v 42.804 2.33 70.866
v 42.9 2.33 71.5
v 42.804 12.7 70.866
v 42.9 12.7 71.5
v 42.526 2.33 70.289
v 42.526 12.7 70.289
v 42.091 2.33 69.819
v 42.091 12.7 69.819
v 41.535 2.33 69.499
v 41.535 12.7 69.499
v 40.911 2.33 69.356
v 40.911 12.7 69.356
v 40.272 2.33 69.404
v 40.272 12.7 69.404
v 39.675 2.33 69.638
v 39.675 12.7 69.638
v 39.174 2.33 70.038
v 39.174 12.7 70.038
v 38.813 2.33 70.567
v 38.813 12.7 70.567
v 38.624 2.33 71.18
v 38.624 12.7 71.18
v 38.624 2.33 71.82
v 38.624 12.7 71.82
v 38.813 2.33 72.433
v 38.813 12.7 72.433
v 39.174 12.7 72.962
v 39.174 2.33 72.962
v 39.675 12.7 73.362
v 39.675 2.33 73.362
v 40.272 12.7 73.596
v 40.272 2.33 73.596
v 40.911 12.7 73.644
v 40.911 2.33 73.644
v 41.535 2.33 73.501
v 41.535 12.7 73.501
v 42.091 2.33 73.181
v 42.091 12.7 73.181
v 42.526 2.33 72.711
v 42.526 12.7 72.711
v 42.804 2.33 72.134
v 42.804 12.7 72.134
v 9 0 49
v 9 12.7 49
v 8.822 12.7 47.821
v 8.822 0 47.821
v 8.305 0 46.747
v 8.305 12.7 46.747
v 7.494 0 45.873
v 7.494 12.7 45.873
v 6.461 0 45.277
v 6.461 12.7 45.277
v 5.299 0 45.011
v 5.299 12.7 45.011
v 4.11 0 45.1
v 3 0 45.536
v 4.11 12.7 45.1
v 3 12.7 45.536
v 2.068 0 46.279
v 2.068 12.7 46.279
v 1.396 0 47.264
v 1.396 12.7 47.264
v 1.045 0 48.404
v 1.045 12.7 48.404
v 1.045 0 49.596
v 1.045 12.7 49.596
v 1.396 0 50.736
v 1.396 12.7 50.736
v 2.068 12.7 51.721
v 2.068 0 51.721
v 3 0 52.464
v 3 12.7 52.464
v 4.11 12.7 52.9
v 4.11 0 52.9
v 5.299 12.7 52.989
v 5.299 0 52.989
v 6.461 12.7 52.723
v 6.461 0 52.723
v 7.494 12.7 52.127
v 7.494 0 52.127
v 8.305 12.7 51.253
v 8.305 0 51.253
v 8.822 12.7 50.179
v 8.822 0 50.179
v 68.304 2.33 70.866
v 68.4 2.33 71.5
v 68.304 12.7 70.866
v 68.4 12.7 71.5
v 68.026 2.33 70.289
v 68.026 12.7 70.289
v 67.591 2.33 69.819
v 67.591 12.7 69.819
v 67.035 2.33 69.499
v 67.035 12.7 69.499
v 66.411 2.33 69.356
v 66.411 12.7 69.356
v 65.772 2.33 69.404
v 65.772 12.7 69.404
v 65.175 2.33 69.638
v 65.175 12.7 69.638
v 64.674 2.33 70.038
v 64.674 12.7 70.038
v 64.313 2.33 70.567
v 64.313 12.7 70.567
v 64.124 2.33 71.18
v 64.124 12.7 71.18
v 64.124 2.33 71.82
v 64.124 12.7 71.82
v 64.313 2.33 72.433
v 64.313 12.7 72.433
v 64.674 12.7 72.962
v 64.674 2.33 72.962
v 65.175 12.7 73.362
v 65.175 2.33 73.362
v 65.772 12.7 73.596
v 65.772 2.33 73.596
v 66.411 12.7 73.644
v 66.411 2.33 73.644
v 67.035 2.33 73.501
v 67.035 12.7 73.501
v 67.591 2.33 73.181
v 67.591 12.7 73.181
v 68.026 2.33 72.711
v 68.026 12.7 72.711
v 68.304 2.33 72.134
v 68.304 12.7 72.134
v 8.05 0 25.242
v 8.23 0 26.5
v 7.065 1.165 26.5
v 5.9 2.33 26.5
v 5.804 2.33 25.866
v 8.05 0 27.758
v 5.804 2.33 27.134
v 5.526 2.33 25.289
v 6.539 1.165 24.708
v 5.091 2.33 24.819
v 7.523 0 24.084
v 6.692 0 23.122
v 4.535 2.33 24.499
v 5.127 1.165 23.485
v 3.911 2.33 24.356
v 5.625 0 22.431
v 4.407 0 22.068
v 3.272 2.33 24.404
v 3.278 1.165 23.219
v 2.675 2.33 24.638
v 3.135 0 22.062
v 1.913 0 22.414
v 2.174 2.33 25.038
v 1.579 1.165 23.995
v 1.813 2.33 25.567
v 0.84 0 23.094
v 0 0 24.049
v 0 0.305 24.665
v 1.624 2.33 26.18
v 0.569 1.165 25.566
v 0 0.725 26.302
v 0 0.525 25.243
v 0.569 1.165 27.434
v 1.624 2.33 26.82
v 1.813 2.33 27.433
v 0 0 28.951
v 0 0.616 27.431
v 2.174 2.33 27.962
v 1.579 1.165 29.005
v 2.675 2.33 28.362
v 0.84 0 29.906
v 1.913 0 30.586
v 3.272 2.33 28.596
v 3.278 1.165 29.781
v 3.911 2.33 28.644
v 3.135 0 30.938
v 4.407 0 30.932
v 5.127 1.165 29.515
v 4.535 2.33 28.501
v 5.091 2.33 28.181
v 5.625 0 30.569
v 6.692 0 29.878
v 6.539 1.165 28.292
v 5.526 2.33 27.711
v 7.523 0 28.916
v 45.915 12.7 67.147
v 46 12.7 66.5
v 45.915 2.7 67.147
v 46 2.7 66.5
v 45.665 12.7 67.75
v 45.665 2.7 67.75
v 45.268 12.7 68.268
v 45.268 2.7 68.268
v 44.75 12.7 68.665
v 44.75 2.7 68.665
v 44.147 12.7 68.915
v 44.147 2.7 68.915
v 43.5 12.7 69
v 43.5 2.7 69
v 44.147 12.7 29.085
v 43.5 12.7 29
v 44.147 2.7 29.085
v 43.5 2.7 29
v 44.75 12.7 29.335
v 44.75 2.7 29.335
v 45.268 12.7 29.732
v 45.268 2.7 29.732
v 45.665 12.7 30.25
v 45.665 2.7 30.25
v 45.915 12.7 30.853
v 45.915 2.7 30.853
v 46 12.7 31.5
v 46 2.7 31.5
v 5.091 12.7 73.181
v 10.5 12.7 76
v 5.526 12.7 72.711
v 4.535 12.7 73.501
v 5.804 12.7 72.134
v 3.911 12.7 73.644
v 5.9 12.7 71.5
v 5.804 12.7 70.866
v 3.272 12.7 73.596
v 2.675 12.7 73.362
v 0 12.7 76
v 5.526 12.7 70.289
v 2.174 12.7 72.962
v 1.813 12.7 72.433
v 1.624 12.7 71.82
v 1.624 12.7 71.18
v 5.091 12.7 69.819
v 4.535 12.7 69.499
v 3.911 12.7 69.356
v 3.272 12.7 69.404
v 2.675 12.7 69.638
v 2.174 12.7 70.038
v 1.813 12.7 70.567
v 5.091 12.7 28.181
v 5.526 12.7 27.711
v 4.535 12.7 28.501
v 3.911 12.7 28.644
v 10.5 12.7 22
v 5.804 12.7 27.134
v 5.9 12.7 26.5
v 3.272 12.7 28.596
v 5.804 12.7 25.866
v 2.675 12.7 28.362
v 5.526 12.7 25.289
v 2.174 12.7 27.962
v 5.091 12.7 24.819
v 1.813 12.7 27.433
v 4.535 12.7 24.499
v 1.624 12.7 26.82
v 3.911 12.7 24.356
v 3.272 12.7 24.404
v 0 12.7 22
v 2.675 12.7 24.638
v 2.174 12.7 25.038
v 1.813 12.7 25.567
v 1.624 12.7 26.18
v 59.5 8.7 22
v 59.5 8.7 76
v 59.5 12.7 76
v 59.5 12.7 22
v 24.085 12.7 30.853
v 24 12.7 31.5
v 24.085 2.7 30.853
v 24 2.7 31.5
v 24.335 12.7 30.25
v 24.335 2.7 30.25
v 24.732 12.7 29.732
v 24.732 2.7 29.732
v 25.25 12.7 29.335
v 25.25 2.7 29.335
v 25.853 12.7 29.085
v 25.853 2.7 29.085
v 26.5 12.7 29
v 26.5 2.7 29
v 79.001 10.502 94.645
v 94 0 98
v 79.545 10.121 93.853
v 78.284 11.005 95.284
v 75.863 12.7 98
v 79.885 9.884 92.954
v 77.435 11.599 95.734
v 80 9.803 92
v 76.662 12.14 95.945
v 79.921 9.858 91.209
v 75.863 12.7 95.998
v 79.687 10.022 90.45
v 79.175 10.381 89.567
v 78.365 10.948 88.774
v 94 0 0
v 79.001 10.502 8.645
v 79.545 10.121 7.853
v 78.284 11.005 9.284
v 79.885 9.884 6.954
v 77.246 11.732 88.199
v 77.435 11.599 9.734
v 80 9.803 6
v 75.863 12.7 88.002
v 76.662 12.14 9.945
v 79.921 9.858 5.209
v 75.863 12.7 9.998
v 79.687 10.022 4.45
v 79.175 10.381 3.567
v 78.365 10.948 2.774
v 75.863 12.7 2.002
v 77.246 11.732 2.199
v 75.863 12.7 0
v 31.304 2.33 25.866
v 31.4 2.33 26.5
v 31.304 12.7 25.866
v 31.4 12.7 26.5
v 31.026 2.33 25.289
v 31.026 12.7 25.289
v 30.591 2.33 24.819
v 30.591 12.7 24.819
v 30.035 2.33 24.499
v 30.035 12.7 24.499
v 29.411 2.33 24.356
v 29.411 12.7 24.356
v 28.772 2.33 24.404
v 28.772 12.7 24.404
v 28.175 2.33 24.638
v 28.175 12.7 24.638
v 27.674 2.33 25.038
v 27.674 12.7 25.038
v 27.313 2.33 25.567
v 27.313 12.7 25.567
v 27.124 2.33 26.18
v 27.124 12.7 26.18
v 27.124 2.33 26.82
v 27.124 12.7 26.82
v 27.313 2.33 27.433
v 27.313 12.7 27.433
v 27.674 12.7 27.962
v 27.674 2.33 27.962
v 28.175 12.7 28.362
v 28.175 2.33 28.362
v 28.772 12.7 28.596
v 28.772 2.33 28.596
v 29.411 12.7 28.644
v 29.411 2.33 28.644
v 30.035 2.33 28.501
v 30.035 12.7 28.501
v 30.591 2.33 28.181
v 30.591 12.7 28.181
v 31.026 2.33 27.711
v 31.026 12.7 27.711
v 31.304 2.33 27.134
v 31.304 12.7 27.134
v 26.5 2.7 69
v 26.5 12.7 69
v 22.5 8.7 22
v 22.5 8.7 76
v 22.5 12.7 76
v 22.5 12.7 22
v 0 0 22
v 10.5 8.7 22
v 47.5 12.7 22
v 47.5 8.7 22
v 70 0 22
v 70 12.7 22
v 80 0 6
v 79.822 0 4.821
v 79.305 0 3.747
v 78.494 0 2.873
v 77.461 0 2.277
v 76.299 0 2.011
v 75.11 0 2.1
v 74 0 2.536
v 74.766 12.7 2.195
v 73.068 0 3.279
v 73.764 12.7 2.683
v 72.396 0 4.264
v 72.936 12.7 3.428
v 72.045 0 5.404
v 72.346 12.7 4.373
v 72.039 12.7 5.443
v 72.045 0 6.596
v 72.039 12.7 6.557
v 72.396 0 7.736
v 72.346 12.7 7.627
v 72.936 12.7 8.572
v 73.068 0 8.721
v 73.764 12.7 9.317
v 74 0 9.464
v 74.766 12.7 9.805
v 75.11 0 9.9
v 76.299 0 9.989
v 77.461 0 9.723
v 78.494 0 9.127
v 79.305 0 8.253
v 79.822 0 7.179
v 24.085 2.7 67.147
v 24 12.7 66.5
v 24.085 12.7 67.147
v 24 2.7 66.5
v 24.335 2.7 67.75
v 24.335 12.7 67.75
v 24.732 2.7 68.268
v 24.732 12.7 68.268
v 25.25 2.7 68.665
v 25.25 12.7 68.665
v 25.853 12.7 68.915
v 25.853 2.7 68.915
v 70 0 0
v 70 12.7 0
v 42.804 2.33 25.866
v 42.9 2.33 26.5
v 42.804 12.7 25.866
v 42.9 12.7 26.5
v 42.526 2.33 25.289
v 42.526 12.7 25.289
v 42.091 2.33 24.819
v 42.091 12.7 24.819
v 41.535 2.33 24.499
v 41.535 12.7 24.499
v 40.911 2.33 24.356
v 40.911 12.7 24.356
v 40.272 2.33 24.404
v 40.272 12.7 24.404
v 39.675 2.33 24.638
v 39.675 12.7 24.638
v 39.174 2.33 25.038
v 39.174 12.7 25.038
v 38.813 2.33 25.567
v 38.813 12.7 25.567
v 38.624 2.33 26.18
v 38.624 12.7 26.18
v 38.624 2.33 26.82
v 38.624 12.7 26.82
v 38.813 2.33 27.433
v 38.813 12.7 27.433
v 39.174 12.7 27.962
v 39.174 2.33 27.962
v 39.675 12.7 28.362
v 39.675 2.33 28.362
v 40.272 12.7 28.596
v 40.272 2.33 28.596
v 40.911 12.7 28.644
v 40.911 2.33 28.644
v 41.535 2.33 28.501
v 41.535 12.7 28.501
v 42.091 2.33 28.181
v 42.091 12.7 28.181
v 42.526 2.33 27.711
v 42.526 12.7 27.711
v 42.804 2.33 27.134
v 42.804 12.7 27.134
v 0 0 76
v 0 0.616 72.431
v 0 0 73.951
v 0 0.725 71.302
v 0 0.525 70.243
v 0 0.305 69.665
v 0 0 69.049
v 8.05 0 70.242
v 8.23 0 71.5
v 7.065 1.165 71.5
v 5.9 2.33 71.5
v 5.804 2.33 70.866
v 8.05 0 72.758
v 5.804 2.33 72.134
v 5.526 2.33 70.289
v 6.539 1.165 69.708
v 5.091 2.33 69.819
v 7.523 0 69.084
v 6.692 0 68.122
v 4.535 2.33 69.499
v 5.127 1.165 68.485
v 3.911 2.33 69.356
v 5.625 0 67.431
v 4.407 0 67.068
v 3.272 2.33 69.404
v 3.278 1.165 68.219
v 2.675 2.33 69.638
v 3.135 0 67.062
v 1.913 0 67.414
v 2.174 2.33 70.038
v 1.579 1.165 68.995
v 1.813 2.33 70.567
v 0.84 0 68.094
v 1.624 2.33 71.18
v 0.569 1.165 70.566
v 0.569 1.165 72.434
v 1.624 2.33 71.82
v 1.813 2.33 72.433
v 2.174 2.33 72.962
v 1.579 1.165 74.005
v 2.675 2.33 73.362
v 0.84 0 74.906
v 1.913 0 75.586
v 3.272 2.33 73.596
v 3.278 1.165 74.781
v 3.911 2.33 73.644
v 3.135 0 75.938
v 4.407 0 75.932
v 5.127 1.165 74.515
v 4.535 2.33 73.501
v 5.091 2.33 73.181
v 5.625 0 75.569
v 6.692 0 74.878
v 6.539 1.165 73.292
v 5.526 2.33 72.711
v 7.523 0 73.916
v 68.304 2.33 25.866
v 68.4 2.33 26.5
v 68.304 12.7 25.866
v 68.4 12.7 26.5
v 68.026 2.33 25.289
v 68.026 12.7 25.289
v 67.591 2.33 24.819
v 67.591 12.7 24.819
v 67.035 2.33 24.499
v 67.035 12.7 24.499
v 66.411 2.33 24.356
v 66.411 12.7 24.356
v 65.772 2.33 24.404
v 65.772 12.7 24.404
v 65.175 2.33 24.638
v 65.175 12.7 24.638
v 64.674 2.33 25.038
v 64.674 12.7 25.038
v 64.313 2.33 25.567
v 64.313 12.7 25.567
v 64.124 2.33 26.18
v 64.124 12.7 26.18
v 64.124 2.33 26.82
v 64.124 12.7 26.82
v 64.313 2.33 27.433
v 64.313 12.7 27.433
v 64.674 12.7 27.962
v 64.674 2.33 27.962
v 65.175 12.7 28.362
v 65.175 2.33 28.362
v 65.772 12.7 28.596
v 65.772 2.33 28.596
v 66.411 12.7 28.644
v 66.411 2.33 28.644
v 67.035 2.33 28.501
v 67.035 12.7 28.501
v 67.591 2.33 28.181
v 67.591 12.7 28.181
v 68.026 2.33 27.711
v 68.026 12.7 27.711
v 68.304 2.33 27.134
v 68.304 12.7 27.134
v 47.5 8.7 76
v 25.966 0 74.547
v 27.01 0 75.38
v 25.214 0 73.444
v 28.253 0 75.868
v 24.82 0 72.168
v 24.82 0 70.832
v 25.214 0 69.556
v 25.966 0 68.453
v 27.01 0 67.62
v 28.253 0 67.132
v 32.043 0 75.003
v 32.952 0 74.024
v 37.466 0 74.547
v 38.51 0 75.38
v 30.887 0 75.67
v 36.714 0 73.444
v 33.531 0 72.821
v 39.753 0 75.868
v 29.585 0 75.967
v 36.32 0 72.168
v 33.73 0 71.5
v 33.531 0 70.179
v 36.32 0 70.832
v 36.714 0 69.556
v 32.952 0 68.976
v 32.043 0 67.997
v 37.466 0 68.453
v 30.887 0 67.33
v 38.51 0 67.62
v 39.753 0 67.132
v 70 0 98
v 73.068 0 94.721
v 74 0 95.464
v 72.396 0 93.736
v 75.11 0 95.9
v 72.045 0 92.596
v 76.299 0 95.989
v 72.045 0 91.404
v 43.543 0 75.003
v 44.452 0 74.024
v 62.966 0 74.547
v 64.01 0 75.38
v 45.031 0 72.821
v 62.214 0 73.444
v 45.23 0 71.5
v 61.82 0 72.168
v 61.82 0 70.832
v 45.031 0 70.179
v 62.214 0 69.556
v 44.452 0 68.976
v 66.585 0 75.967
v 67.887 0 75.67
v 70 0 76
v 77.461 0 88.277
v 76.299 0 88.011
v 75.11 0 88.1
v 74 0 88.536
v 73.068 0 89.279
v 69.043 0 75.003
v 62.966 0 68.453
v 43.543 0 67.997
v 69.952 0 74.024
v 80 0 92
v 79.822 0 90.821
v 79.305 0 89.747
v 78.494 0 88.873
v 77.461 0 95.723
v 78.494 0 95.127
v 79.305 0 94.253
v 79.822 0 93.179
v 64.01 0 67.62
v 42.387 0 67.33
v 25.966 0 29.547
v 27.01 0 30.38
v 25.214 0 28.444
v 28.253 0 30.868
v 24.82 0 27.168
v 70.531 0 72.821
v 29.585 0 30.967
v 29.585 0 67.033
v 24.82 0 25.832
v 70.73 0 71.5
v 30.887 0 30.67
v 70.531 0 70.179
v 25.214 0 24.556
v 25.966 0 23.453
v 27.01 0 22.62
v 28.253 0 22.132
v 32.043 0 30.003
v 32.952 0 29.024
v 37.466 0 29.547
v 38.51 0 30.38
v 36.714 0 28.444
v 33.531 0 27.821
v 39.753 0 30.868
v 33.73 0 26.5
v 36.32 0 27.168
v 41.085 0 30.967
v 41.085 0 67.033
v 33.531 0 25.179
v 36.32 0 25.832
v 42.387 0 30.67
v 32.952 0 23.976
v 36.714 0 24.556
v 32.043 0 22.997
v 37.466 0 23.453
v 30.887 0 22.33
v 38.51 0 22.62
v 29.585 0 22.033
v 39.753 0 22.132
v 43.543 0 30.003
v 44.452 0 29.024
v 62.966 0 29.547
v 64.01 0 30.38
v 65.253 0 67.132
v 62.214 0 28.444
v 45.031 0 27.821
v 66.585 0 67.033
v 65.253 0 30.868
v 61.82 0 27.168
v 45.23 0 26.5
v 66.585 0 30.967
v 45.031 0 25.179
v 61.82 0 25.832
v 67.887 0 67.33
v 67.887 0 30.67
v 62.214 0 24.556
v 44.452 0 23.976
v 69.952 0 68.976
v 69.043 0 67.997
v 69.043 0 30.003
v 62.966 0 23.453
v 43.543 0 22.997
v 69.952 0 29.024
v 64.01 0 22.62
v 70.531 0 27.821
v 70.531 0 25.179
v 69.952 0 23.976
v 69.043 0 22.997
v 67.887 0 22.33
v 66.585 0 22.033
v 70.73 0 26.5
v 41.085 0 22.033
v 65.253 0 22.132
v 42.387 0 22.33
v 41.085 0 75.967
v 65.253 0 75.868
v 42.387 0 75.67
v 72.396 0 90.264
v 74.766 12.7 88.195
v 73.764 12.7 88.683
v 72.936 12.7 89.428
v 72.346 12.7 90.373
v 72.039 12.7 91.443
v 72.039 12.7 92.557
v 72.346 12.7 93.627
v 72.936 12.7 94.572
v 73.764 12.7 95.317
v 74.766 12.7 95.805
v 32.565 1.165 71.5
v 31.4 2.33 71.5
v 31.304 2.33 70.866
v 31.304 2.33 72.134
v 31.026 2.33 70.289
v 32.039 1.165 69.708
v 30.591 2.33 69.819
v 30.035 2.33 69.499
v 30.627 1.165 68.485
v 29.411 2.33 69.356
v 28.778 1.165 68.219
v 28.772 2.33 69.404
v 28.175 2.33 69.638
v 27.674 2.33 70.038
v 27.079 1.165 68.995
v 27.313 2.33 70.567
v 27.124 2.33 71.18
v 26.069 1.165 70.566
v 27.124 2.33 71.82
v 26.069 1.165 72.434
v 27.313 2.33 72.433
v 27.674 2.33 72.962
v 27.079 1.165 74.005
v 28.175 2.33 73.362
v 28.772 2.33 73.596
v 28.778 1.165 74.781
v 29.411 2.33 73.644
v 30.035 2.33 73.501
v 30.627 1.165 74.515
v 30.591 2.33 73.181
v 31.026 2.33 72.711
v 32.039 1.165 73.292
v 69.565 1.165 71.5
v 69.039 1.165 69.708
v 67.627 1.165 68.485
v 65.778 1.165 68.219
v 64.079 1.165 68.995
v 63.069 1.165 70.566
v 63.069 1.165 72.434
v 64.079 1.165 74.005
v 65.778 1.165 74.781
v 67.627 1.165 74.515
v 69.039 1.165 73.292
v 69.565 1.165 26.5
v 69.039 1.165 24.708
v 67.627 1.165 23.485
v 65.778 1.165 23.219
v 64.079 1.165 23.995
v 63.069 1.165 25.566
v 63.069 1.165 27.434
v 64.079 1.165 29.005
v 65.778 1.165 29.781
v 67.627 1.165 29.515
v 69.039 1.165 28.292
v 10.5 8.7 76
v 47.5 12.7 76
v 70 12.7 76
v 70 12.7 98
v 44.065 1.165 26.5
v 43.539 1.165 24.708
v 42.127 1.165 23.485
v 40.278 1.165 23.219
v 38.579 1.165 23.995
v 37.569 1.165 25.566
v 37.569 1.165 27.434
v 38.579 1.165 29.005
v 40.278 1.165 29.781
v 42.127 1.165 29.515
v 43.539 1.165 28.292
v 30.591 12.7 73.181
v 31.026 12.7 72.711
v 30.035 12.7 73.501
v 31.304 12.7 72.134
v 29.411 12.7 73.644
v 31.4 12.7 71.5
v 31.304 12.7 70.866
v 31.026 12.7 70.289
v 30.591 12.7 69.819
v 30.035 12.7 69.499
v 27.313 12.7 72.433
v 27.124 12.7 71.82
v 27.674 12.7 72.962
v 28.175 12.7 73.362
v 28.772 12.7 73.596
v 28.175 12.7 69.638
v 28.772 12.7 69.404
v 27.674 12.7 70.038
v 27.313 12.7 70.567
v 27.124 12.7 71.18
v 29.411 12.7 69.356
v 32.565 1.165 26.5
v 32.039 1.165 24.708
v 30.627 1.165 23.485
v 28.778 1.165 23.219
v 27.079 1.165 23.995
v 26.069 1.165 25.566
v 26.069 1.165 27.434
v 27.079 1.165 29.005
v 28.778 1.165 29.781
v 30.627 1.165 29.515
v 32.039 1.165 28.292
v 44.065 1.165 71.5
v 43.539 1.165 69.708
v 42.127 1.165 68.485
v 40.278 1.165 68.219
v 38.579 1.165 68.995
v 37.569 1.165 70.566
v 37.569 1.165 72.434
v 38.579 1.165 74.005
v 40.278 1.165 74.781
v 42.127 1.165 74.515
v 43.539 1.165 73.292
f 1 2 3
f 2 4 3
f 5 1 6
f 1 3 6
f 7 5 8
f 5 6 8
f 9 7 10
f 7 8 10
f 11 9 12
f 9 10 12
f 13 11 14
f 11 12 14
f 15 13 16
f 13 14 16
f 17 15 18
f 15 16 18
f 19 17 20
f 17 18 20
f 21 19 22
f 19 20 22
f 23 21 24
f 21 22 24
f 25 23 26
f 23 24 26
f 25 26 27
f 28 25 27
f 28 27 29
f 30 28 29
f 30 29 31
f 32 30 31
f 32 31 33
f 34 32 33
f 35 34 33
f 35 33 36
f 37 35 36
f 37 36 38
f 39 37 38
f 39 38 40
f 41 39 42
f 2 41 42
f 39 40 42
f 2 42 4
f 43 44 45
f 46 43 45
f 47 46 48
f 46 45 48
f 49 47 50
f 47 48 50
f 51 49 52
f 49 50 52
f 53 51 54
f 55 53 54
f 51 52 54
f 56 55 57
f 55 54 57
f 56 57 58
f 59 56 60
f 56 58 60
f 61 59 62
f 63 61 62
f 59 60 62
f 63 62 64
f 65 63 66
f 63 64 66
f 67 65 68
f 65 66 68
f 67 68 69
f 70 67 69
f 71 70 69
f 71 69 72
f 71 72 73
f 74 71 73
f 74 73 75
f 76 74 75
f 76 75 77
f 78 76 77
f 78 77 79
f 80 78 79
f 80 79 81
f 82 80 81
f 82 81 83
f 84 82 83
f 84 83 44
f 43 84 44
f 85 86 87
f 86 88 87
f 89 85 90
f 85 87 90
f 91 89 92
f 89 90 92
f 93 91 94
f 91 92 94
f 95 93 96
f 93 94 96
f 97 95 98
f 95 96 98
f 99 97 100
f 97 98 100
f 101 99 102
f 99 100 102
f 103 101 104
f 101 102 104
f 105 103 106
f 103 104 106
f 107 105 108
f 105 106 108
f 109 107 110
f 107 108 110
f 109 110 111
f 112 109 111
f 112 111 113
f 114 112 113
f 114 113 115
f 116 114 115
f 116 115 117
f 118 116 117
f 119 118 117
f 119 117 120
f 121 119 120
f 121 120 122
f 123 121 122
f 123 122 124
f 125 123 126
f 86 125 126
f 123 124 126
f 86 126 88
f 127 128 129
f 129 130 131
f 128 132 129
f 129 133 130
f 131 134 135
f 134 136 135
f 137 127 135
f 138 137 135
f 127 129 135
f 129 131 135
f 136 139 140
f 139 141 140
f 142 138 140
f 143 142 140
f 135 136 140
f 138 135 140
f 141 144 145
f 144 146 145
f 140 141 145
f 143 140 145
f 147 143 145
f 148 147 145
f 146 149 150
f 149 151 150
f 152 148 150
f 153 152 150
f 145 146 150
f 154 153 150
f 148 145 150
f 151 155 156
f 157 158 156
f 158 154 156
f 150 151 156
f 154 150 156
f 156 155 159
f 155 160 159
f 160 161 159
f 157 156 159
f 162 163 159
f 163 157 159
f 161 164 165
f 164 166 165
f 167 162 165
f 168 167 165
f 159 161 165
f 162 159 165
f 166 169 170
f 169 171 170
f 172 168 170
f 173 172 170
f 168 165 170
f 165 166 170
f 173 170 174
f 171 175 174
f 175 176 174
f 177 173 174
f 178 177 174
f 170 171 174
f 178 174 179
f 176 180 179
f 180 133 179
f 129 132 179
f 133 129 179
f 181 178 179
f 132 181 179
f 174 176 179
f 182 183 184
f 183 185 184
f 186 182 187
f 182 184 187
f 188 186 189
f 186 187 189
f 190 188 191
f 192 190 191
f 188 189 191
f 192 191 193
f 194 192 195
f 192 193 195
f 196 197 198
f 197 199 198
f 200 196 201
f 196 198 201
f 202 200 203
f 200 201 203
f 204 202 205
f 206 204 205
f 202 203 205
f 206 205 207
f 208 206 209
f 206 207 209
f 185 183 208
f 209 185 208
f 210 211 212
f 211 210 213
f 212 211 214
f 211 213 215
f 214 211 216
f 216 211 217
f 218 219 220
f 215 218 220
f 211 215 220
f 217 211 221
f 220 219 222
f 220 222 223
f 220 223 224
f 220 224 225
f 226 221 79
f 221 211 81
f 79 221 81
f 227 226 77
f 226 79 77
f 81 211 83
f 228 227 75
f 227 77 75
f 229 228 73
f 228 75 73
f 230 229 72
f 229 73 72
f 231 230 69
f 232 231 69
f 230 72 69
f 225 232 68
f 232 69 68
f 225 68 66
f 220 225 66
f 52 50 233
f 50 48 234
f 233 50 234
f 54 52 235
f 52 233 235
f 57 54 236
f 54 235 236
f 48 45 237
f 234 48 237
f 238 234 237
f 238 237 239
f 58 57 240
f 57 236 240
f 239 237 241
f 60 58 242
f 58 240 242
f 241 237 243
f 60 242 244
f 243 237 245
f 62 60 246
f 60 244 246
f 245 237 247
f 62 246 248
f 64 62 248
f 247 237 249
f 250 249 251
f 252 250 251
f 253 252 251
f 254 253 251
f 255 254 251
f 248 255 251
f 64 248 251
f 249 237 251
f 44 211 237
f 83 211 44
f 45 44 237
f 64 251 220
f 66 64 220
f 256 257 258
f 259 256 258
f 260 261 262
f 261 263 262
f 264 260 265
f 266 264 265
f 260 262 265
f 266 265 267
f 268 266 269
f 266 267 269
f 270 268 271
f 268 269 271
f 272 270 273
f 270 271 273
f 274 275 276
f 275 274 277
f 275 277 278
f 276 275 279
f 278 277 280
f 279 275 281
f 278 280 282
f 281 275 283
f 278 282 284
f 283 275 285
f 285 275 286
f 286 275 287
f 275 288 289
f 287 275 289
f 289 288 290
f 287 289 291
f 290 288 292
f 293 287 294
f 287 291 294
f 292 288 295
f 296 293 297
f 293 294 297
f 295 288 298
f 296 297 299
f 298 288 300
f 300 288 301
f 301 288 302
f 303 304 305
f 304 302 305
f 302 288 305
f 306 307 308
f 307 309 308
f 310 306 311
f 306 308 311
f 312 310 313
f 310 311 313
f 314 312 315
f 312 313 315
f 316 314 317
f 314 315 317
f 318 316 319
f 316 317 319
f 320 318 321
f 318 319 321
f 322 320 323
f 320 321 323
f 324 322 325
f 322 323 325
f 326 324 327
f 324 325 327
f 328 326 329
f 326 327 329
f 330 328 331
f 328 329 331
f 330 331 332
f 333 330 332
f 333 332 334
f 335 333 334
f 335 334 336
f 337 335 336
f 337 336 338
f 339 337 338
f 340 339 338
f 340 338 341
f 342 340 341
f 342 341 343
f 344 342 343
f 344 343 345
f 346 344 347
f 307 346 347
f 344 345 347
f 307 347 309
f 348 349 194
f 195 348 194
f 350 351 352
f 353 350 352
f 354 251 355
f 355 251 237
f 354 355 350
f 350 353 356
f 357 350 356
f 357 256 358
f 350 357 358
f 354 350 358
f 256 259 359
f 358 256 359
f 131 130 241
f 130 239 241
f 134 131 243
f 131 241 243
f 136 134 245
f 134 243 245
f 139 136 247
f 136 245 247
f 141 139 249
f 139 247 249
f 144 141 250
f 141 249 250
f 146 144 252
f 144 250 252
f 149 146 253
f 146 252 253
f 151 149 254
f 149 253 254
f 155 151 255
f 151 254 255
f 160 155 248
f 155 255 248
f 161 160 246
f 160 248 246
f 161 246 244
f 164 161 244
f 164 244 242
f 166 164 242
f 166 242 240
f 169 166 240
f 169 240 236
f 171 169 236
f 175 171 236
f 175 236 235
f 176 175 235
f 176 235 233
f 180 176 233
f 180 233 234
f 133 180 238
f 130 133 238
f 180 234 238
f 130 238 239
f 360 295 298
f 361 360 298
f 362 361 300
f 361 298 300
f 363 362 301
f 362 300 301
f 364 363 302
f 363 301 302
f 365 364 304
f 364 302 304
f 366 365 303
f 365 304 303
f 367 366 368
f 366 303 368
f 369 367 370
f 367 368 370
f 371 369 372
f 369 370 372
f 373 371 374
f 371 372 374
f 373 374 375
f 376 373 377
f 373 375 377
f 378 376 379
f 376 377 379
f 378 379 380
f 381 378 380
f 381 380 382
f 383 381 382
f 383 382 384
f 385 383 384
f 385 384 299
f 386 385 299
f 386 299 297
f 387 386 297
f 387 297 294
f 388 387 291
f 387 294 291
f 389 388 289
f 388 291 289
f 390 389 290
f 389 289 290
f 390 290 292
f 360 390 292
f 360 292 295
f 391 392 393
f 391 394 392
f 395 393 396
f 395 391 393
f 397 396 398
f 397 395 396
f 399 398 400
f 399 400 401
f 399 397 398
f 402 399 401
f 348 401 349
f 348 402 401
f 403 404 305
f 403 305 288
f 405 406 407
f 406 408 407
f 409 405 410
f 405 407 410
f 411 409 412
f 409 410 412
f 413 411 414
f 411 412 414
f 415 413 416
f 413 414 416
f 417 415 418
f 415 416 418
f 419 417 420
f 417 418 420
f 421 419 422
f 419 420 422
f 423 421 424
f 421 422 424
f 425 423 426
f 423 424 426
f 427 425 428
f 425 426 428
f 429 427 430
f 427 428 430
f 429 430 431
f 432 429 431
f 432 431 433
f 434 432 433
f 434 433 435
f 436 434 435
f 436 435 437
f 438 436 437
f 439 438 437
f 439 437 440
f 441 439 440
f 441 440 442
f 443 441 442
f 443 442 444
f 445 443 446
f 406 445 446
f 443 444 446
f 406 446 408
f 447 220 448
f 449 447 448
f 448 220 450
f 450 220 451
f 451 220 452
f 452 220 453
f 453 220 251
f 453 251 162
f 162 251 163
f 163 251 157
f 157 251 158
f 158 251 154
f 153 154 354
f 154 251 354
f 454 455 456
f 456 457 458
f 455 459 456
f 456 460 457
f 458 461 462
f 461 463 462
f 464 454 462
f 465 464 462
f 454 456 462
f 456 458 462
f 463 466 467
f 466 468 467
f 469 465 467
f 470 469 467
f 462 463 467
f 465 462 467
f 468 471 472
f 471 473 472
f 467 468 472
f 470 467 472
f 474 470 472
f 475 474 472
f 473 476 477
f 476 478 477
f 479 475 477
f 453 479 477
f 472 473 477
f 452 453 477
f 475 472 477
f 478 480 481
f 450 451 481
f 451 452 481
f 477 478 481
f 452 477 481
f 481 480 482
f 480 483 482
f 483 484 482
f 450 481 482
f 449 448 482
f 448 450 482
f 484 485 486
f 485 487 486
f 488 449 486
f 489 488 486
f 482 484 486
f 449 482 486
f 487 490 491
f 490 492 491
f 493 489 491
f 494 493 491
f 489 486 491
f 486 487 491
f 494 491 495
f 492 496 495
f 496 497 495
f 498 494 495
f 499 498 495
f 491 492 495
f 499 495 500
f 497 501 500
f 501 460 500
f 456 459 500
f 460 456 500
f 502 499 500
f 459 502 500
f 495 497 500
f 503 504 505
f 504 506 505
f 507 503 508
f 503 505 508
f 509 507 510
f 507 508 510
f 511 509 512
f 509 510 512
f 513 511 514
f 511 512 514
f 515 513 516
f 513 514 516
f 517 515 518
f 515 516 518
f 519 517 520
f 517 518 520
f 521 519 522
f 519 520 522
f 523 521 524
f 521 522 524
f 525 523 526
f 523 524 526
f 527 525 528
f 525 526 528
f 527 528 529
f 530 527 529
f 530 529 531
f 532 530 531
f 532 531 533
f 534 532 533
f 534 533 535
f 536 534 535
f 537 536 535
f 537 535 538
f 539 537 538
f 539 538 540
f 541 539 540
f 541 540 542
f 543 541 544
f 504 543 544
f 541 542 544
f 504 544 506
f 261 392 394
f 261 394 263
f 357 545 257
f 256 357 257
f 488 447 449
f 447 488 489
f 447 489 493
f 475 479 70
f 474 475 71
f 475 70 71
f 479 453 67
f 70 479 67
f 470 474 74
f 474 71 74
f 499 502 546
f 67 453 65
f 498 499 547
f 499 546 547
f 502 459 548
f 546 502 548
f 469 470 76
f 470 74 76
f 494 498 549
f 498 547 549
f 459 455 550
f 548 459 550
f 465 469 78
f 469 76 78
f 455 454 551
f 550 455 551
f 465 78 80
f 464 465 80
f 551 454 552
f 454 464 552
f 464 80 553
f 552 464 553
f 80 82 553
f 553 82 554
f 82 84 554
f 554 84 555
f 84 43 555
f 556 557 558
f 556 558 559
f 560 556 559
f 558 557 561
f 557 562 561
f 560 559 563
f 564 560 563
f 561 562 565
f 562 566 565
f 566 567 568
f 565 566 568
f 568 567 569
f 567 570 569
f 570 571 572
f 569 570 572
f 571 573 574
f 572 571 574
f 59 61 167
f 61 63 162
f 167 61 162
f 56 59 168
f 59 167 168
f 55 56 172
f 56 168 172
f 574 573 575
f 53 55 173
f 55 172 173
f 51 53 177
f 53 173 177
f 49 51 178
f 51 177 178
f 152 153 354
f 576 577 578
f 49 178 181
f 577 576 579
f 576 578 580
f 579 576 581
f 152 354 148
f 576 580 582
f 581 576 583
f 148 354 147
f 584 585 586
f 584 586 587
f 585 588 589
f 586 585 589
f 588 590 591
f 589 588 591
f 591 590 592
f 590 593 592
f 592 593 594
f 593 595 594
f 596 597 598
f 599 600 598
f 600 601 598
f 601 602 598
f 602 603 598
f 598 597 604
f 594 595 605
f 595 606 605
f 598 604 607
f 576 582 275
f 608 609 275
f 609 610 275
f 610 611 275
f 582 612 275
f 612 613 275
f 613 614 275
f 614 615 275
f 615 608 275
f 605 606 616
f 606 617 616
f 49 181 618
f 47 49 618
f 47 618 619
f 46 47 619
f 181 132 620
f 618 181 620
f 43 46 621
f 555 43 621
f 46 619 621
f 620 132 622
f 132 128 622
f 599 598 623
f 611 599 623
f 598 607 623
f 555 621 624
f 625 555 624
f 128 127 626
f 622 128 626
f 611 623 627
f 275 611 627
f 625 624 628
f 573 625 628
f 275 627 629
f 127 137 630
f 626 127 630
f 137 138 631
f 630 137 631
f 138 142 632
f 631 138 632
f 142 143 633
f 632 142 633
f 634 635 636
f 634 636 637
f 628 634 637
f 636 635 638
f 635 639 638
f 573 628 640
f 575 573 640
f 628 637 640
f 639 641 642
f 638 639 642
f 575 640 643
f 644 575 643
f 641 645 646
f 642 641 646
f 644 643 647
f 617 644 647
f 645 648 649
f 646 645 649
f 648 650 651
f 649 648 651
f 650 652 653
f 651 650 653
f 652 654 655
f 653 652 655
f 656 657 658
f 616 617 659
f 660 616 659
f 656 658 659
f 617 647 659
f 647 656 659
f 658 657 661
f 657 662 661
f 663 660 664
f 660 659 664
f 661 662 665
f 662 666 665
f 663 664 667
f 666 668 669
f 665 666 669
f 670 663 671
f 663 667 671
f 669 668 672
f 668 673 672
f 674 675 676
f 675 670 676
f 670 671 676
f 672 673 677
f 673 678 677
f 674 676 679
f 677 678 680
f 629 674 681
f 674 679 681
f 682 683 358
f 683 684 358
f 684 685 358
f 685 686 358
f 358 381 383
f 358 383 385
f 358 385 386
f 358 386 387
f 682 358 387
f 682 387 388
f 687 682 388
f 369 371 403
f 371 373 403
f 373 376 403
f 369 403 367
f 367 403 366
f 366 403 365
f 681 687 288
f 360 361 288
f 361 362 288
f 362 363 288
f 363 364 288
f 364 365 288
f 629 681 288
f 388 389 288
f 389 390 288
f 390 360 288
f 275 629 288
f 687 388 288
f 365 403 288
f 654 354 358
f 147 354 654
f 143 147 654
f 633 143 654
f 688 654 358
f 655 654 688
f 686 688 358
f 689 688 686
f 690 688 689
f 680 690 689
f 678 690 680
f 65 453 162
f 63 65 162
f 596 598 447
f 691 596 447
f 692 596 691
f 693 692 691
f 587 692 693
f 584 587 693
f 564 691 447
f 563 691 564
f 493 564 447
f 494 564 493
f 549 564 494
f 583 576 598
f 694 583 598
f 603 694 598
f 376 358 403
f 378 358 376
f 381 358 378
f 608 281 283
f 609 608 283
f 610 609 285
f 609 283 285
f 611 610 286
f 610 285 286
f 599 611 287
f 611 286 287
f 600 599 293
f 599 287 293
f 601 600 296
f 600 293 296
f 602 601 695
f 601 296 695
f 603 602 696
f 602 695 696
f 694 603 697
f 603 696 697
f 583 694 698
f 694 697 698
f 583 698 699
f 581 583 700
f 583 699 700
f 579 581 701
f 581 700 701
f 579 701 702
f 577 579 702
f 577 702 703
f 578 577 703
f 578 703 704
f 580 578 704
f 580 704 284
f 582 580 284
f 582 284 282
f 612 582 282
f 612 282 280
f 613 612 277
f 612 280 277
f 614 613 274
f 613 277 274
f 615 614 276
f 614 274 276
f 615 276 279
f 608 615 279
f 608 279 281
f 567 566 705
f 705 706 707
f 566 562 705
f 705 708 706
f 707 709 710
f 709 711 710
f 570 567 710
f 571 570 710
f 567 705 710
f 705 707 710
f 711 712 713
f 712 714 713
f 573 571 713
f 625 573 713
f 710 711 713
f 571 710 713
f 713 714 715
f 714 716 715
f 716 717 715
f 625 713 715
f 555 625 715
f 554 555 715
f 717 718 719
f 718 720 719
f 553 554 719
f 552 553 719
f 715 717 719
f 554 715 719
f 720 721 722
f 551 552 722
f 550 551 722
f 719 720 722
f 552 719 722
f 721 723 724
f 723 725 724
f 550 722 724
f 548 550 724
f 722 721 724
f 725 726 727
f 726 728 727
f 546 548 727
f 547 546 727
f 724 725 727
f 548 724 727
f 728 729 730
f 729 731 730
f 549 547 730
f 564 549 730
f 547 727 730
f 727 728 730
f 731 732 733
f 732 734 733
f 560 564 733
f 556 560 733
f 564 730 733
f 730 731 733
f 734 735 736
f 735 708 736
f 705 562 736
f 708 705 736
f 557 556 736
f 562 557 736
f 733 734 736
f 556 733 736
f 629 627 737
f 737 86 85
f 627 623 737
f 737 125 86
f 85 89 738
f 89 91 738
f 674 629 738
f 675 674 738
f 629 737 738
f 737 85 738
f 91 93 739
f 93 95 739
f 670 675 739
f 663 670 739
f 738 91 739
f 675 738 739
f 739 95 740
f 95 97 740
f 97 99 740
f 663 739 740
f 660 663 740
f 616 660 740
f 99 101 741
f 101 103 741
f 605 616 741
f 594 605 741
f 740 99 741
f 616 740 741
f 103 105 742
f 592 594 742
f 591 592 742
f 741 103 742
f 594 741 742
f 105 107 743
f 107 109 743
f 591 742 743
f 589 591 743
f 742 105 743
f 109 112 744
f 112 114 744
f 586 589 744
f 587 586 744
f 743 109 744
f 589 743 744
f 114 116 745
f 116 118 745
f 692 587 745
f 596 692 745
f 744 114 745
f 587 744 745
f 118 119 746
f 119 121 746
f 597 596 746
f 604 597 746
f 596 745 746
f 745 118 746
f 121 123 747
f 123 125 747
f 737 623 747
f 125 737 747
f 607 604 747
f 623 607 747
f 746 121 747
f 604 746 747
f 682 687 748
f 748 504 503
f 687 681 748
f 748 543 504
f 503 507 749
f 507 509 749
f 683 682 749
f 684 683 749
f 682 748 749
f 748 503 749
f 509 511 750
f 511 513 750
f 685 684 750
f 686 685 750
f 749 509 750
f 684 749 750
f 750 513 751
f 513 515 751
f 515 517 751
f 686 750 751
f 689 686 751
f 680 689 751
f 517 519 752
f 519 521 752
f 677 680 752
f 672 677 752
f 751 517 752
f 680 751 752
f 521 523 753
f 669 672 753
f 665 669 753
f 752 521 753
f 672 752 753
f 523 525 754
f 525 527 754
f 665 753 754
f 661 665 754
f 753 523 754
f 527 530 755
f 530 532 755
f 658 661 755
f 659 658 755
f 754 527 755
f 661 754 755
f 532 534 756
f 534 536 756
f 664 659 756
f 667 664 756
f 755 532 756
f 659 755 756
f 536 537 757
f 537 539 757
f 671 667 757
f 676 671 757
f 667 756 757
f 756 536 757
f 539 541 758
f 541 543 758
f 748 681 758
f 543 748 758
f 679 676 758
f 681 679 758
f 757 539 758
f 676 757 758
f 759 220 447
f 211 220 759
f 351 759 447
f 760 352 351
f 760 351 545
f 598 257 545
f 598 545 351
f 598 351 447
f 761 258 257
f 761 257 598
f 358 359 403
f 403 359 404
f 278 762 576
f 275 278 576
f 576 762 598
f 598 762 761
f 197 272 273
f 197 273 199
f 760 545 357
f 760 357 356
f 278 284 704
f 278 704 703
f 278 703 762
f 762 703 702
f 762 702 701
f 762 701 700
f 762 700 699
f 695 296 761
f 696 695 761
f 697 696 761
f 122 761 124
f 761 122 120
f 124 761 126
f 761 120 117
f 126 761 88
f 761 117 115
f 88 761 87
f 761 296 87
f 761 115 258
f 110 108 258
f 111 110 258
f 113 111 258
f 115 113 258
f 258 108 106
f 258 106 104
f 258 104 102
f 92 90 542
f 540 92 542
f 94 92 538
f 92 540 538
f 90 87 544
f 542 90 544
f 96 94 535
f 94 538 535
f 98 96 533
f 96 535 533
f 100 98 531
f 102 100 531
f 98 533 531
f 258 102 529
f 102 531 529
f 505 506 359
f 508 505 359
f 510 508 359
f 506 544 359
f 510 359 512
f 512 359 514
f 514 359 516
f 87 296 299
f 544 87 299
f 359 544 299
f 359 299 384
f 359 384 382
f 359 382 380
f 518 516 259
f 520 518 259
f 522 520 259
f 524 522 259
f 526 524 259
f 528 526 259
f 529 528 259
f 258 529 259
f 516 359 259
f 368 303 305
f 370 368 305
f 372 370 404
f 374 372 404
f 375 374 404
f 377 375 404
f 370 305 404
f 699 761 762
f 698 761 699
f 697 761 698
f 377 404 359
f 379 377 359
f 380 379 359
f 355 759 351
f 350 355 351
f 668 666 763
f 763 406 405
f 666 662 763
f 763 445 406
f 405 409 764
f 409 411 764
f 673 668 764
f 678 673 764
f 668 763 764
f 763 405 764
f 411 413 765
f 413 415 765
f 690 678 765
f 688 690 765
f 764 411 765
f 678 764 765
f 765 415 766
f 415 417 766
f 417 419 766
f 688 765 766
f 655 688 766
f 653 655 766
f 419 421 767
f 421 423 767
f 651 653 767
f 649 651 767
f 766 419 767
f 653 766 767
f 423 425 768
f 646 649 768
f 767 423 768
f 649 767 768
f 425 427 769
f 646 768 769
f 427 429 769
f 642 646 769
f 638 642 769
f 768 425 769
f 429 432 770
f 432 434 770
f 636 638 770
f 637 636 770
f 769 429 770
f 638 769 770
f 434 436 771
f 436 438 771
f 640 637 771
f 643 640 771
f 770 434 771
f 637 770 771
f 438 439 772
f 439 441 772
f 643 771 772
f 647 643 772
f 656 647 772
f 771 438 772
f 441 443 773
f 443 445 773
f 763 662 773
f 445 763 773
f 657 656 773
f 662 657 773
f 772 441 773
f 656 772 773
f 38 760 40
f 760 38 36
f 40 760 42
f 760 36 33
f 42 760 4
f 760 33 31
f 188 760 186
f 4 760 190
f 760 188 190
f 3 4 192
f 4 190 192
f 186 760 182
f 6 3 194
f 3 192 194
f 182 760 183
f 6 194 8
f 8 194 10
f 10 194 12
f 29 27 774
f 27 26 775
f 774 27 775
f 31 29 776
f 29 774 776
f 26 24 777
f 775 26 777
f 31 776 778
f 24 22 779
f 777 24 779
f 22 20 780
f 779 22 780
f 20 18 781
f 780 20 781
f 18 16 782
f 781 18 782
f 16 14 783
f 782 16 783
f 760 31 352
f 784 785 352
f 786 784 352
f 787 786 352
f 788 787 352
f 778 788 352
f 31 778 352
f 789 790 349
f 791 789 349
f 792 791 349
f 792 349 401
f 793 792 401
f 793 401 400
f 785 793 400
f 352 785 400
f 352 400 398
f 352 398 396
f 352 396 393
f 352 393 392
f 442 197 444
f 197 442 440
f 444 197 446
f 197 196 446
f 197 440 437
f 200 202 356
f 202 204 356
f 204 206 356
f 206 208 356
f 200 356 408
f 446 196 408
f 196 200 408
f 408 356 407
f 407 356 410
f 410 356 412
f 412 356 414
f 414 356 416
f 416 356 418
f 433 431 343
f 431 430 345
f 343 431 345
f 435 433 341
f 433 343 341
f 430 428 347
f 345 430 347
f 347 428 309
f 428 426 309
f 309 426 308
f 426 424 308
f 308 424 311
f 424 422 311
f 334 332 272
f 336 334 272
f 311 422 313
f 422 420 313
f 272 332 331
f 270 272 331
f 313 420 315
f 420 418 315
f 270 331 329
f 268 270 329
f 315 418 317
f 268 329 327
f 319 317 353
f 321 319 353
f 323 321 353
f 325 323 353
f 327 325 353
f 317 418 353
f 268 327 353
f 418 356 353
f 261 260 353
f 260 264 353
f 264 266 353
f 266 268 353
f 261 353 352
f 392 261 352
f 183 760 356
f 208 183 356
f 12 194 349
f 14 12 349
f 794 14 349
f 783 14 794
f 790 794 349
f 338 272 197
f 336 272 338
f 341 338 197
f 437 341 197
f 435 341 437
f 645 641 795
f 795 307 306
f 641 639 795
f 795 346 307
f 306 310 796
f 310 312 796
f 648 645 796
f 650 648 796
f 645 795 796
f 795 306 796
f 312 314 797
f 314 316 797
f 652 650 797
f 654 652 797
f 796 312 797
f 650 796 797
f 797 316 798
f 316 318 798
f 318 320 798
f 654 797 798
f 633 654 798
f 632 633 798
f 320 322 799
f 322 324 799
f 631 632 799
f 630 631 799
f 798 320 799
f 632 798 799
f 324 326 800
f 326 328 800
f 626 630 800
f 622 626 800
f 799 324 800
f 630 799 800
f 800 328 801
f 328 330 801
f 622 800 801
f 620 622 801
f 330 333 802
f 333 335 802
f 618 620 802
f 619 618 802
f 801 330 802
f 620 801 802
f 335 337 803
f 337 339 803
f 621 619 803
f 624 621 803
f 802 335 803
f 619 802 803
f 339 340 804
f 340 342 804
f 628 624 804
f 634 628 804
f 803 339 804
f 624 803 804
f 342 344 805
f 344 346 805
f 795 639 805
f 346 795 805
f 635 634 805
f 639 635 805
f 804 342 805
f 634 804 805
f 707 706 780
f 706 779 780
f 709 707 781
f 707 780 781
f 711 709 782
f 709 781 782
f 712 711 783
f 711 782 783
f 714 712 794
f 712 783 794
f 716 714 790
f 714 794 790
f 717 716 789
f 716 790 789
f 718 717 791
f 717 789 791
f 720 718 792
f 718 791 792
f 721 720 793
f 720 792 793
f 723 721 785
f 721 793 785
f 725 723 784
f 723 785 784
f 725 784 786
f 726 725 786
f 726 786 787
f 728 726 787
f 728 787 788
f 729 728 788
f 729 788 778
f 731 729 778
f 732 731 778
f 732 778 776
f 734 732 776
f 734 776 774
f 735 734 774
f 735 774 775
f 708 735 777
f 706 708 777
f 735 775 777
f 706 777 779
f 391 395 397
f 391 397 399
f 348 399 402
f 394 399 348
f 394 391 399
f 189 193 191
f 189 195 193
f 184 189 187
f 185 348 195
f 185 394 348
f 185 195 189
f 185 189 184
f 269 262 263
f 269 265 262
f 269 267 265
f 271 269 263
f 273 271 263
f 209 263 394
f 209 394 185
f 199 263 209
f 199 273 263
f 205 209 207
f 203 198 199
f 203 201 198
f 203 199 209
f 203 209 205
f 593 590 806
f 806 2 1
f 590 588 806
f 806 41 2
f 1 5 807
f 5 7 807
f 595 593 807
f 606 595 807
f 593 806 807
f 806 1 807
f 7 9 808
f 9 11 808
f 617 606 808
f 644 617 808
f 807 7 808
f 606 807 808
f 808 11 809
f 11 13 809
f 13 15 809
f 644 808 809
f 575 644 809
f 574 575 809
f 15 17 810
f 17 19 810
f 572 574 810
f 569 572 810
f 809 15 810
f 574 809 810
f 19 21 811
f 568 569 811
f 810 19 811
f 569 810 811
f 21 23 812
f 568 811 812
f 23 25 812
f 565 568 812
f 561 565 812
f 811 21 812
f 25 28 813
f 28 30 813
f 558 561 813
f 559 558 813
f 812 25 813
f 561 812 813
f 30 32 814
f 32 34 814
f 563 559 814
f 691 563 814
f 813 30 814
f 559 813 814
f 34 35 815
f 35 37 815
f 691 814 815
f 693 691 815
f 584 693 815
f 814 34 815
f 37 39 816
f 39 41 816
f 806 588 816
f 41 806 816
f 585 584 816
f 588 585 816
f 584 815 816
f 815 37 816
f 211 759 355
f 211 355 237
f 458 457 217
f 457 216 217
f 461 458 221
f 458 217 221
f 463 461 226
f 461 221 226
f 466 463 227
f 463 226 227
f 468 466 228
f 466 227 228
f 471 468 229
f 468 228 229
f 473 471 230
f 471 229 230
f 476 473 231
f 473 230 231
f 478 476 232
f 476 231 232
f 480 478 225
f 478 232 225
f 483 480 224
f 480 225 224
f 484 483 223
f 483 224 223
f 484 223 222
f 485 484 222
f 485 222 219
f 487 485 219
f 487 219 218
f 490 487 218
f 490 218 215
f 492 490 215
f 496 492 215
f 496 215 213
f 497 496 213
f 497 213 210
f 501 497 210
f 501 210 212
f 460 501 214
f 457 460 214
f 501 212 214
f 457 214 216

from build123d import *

# Parameters (mm, degrees)
RESSALTO_EXTRUS_O1_DEPTH                            = 98
ESBO_O4_W                                           = 33
ESBO_O4_H                                           = 22
CORTE_EXTRUS_O3_DEPTH                               = 25
ESBO_O2_R                                           = 4
CORTE_EXTRUS_O1_DEPTH                               = 98
ESBO_O10_W                                          = 12
ESBO_O10_H                                          = 4
CORTE_EXTRUS_O8_DEPTH                               = 77
ESBO_O11_R                                          = 1.6
CORTE_EXTRUS_O9_DEPTH                               = 20
ESBO_O12_W                                          = 22
ESBO_O12_H                                          = 40
CORTE_EXTRUS_O10_DEPTH                              = 10
FILETE1_R                                           = 2.5
ESCAREADO_PARA_PARAFUSO_ALLEN_SEXTAVADO_D           = 4.3
ESCAREADO_PARA_PARAFUSO_ALLEN_SEXTAVADO_CSINK_D     = 8.96
ESCAREADO_PARA_PARAFUSO_ALLEN_SEXTAVADO_CSINK_ANGLE = 90
ESBO_O15_W                                          = 4
ESBO_O15_H                                          = 22
CORTE_EXTRUS_O11_DEPTH                              = 13.7


with BuildPart() as part:
    # Esboço1 → Ressalto-extrusão1 (new body)
    with BuildSketch(Plane.XY):
        Polygon((0, 0), (94, 0), (75.862520314, 12.7), (0, 12.7), align=None)
    extrude(amount=RESSALTO_EXTRUS_O1_DEPTH)

    # Esboço4 → Corte-extrusão3 (cut)
    with BuildSketch(Plane(origin=(0, 12.7, 0), x_dir=(1, 0, 0), z_dir=(0, 1, 0))):
        with Locations((16.5, -87)):
            Rectangle(ESBO_O4_W, ESBO_O4_H)
        with Locations((16.5, -11)):
            Rectangle(ESBO_O4_W, ESBO_O4_H)
        with Locations((53.5, -87)):
            Rectangle(ESBO_O4_W, ESBO_O4_H)
        with Locations((53.5, -11)):
            Rectangle(ESBO_O4_W, ESBO_O4_H)
    extrude(amount=-CORTE_EXTRUS_O3_DEPTH, mode=Mode.SUBTRACT)

    # Esboço2 → Corte-extrusão1 (cut)
    with BuildSketch(Plane(origin=(0, 12.7, 0), x_dir=(1, 0, 0), z_dir=(0, 1, 0))):
        with Locations((76, -92)):
            Circle(ESBO_O2_R)
        with Locations((76, -6)):
            Circle(ESBO_O2_R)
        with Locations((5, -49)):
            Circle(ESBO_O2_R)
    extrude(amount=-CORTE_EXTRUS_O1_DEPTH, mode=Mode.SUBTRACT)

    # Esboço10 → Corte-extrusão8 (cut, through all)
    with BuildSketch(Plane.XY.offset(76)):
        with Locations((16.5, 10.7)):
            Rectangle(ESBO_O10_W, ESBO_O10_H)
        with Locations((53.5, 10.7)):
            Rectangle(ESBO_O10_W, ESBO_O10_H)
    extrude(amount=-CORTE_EXTRUS_O8_DEPTH, mode=Mode.SUBTRACT)

    # Esboço11 → Corte-extrusão9 (cut)
    with BuildSketch(Plane(origin=(0, 12.7, 0), x_dir=(1, 0, 0), z_dir=(0, 1, 0))):
        with Locations((29.25, -26.5)):
            Circle(ESBO_O11_R)
        with Locations((29.25, -71.5)):
            Circle(ESBO_O11_R)
        with Locations((3.75, -71.5)):
            Circle(ESBO_O11_R)
        with Locations((3.75, -26.5)):
            Circle(ESBO_O11_R)
        with Locations((40.75, -26.5)):
            Circle(ESBO_O11_R)
        with Locations((66.25, -26.5)):
            Circle(ESBO_O11_R)
        with Locations((66.25, -71.5)):
            Circle(ESBO_O11_R)
        with Locations((40.75, -71.5)):
            Circle(ESBO_O11_R)
    extrude(amount=-CORTE_EXTRUS_O9_DEPTH, mode=Mode.SUBTRACT)

    # Esboço12 → Corte-extrusão10 (cut)
    with BuildSketch(Plane(origin=(0, 12.7, 0), x_dir=(1, 0, 0), z_dir=(0, 1, 0))):
        with Locations((35, -49)):
            Rectangle(ESBO_O12_W, ESBO_O12_H)
    extrude(amount=-CORTE_EXTRUS_O10_DEPTH, mode=Mode.SUBTRACT)

    # Filete1
    filete1_edges = [part.edges().sort_by_distance(p)[0] for p in [
        (46, 7.7, 29),
        (46, 7.7, 69),
        (24, 7.7, 69),
        (24, 7.7, 29),
    ]]
    fillet(filete1_edges, radius=FILETE1_R)

    # Escareado para parafuso Allen sextavado escareado de M41 (through all)
    with Locations(Plane(origin=(0, 0, 0), x_dir=(-1, 0, 0), z_dir=(0, -1, 0))):
        with Locations((-66.25, -71.5), (-66.25, -26.5), (-40.75, -26.5), (-29.25, -26.5), (-29.25, -71.5), (-40.75, -71.5), (-3.75, -71.5), (-3.75, -26.5)):
            CounterSinkHole(ESCAREADO_PARA_PARAFUSO_ALLEN_SEXTAVADO_D / 2, ESCAREADO_PARA_PARAFUSO_ALLEN_SEXTAVADO_CSINK_D / 2, counter_sink_angle=ESCAREADO_PARA_PARAFUSO_ALLEN_SEXTAVADO_CSINK_ANGLE)

    # Esboço15 → Corte-extrusão11 (cut, through all)
    with BuildSketch(Plane(origin=(0, 12.7, 0), x_dir=(1, 0, 0), z_dir=(0, 1, 0))):
        with Locations((35, -11)):
            Rectangle(ESBO_O15_W, ESBO_O15_H)
        with Locations((35, -87)):
            Rectangle(ESBO_O15_W, ESBO_O15_H)
    extrude(amount=-CORTE_EXTRUS_O11_DEPTH, mode=Mode.SUBTRACT)


solid = part.part
